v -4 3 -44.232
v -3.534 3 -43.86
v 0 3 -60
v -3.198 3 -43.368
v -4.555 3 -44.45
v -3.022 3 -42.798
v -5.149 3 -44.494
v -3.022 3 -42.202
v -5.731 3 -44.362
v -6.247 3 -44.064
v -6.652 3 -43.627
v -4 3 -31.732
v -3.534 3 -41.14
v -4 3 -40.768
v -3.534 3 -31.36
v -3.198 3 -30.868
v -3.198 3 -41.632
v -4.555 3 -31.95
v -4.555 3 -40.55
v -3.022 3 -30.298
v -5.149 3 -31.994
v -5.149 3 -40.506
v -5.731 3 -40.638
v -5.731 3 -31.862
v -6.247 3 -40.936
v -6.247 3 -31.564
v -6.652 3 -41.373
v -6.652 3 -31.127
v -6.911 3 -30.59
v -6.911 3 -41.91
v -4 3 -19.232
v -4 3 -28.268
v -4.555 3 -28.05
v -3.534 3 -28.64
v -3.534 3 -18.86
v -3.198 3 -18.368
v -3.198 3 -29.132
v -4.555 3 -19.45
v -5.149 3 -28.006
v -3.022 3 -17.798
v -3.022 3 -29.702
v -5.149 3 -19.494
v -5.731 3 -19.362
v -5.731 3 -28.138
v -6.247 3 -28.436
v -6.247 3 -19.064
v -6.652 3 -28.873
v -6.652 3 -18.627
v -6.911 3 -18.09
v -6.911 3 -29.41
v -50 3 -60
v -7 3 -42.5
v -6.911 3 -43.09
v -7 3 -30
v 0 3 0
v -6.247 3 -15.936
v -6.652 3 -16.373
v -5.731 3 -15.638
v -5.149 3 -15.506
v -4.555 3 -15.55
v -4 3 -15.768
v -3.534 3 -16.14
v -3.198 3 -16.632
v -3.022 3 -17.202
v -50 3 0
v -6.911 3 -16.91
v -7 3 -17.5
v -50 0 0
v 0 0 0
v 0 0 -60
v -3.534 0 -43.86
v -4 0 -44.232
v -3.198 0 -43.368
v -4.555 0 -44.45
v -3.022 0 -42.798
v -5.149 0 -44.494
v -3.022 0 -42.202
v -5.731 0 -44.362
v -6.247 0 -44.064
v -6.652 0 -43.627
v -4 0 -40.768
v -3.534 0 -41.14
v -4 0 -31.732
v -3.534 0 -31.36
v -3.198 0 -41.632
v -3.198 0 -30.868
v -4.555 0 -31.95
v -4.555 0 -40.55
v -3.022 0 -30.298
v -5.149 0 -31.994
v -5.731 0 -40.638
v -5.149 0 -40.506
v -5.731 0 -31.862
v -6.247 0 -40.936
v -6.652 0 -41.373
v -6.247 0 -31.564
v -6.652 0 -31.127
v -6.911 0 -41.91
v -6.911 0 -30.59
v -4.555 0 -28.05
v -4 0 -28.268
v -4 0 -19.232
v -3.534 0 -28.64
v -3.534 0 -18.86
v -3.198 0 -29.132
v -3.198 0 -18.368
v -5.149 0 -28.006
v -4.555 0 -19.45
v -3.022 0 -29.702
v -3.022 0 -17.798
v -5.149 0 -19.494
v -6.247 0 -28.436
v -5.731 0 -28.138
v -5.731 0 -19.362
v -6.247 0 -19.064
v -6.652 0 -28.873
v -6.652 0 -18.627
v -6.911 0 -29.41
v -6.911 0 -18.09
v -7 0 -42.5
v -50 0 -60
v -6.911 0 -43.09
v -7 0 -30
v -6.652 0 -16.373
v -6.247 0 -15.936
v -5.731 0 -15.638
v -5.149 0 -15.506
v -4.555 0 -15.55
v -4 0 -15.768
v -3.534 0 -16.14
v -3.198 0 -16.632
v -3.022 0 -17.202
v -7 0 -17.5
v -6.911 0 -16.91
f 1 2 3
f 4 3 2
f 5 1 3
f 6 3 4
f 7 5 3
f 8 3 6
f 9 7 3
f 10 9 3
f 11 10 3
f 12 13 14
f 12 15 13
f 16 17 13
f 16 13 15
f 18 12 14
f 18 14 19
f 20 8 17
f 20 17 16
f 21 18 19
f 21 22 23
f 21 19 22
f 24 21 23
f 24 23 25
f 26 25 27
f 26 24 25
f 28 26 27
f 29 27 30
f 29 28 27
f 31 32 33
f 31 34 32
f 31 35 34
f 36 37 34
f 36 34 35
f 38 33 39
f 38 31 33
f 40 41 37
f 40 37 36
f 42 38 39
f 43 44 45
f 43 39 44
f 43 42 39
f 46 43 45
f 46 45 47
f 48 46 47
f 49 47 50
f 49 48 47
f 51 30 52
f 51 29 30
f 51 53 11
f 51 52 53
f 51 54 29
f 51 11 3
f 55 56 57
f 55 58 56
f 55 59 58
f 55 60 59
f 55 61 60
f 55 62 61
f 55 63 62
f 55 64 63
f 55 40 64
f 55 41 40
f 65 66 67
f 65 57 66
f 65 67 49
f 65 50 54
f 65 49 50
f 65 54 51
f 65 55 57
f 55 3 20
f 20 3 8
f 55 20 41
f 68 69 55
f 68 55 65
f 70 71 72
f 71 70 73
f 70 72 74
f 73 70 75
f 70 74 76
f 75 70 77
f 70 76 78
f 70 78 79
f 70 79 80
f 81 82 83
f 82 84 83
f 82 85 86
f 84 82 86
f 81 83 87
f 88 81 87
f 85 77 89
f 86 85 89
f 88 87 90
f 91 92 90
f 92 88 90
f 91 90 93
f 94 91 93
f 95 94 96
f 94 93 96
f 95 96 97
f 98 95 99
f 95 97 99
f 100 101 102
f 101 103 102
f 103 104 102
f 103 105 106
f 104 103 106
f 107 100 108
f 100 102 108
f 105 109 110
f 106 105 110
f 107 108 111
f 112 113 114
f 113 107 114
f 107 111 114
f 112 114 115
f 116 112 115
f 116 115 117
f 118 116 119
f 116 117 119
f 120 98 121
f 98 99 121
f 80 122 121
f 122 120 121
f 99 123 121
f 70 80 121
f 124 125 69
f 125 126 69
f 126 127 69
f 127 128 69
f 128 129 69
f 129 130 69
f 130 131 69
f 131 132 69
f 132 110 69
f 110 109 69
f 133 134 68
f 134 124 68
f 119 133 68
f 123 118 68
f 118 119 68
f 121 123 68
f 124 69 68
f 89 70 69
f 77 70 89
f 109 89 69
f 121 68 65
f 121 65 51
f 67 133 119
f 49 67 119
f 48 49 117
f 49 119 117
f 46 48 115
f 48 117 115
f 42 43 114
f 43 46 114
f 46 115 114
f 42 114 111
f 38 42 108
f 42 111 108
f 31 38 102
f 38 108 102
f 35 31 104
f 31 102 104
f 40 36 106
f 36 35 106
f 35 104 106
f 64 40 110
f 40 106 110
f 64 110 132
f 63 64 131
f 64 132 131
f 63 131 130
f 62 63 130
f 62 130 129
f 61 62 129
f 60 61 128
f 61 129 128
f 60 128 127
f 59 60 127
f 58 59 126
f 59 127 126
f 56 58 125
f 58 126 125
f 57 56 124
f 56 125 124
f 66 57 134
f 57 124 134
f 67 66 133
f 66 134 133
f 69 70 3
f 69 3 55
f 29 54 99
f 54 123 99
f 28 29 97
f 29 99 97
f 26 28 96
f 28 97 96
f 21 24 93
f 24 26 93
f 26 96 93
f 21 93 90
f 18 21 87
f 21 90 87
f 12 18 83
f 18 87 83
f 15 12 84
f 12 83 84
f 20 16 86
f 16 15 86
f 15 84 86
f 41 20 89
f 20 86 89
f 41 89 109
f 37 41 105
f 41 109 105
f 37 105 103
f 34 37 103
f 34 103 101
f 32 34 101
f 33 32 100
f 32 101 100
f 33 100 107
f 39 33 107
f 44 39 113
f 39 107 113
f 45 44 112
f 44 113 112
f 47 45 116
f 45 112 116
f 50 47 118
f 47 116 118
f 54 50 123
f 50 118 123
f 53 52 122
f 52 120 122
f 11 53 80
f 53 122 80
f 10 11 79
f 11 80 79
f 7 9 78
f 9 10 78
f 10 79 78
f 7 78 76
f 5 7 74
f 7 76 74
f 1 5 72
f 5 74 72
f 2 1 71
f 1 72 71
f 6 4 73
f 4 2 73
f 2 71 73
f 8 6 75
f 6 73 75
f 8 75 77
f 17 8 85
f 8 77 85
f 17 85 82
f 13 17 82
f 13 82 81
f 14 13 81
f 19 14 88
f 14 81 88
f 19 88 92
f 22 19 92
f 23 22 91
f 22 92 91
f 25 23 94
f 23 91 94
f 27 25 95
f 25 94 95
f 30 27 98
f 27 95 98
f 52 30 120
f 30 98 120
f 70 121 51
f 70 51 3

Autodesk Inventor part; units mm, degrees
ref_plane "YZ Plane" through (0, 0, 0) normal (1, 0, 0) x (0, 1, 0)
ref_plane "XZ Plane" through (0, 0, 0) normal (0, 1, 0) x (-1, 0, 0)
ref_plane "XY Plane" through (0, 0, 0) normal (0, 0, 1) x (1, 0, 0)
sketch "Sketch1" plane through (0, 0, 0) normal (0, 1, 0) x (-1, 0, 0)
  line L0 (0, 0) -> (50, 0)
  line L1 (50, 0) -> (50, -60)
  line L2 (50, -60) -> (0, -60)
  line L3 (0, -60) -> (0, 0)
  circle A0 centre (5, -30) radius 2
  circle A1 centre (5, -42.5) radius 2
  circle A2 centre (5, -17.5) radius 2
  dimension "d0" = 50
  dimension "d1" = 60
  dimension "d2" = 4
  dimension "d3" = 4
  dimension "d4" = 4
extrude "Extrusion1" add sketch "Sketch1" along normal blind 3
properties part number "dc clamps"
